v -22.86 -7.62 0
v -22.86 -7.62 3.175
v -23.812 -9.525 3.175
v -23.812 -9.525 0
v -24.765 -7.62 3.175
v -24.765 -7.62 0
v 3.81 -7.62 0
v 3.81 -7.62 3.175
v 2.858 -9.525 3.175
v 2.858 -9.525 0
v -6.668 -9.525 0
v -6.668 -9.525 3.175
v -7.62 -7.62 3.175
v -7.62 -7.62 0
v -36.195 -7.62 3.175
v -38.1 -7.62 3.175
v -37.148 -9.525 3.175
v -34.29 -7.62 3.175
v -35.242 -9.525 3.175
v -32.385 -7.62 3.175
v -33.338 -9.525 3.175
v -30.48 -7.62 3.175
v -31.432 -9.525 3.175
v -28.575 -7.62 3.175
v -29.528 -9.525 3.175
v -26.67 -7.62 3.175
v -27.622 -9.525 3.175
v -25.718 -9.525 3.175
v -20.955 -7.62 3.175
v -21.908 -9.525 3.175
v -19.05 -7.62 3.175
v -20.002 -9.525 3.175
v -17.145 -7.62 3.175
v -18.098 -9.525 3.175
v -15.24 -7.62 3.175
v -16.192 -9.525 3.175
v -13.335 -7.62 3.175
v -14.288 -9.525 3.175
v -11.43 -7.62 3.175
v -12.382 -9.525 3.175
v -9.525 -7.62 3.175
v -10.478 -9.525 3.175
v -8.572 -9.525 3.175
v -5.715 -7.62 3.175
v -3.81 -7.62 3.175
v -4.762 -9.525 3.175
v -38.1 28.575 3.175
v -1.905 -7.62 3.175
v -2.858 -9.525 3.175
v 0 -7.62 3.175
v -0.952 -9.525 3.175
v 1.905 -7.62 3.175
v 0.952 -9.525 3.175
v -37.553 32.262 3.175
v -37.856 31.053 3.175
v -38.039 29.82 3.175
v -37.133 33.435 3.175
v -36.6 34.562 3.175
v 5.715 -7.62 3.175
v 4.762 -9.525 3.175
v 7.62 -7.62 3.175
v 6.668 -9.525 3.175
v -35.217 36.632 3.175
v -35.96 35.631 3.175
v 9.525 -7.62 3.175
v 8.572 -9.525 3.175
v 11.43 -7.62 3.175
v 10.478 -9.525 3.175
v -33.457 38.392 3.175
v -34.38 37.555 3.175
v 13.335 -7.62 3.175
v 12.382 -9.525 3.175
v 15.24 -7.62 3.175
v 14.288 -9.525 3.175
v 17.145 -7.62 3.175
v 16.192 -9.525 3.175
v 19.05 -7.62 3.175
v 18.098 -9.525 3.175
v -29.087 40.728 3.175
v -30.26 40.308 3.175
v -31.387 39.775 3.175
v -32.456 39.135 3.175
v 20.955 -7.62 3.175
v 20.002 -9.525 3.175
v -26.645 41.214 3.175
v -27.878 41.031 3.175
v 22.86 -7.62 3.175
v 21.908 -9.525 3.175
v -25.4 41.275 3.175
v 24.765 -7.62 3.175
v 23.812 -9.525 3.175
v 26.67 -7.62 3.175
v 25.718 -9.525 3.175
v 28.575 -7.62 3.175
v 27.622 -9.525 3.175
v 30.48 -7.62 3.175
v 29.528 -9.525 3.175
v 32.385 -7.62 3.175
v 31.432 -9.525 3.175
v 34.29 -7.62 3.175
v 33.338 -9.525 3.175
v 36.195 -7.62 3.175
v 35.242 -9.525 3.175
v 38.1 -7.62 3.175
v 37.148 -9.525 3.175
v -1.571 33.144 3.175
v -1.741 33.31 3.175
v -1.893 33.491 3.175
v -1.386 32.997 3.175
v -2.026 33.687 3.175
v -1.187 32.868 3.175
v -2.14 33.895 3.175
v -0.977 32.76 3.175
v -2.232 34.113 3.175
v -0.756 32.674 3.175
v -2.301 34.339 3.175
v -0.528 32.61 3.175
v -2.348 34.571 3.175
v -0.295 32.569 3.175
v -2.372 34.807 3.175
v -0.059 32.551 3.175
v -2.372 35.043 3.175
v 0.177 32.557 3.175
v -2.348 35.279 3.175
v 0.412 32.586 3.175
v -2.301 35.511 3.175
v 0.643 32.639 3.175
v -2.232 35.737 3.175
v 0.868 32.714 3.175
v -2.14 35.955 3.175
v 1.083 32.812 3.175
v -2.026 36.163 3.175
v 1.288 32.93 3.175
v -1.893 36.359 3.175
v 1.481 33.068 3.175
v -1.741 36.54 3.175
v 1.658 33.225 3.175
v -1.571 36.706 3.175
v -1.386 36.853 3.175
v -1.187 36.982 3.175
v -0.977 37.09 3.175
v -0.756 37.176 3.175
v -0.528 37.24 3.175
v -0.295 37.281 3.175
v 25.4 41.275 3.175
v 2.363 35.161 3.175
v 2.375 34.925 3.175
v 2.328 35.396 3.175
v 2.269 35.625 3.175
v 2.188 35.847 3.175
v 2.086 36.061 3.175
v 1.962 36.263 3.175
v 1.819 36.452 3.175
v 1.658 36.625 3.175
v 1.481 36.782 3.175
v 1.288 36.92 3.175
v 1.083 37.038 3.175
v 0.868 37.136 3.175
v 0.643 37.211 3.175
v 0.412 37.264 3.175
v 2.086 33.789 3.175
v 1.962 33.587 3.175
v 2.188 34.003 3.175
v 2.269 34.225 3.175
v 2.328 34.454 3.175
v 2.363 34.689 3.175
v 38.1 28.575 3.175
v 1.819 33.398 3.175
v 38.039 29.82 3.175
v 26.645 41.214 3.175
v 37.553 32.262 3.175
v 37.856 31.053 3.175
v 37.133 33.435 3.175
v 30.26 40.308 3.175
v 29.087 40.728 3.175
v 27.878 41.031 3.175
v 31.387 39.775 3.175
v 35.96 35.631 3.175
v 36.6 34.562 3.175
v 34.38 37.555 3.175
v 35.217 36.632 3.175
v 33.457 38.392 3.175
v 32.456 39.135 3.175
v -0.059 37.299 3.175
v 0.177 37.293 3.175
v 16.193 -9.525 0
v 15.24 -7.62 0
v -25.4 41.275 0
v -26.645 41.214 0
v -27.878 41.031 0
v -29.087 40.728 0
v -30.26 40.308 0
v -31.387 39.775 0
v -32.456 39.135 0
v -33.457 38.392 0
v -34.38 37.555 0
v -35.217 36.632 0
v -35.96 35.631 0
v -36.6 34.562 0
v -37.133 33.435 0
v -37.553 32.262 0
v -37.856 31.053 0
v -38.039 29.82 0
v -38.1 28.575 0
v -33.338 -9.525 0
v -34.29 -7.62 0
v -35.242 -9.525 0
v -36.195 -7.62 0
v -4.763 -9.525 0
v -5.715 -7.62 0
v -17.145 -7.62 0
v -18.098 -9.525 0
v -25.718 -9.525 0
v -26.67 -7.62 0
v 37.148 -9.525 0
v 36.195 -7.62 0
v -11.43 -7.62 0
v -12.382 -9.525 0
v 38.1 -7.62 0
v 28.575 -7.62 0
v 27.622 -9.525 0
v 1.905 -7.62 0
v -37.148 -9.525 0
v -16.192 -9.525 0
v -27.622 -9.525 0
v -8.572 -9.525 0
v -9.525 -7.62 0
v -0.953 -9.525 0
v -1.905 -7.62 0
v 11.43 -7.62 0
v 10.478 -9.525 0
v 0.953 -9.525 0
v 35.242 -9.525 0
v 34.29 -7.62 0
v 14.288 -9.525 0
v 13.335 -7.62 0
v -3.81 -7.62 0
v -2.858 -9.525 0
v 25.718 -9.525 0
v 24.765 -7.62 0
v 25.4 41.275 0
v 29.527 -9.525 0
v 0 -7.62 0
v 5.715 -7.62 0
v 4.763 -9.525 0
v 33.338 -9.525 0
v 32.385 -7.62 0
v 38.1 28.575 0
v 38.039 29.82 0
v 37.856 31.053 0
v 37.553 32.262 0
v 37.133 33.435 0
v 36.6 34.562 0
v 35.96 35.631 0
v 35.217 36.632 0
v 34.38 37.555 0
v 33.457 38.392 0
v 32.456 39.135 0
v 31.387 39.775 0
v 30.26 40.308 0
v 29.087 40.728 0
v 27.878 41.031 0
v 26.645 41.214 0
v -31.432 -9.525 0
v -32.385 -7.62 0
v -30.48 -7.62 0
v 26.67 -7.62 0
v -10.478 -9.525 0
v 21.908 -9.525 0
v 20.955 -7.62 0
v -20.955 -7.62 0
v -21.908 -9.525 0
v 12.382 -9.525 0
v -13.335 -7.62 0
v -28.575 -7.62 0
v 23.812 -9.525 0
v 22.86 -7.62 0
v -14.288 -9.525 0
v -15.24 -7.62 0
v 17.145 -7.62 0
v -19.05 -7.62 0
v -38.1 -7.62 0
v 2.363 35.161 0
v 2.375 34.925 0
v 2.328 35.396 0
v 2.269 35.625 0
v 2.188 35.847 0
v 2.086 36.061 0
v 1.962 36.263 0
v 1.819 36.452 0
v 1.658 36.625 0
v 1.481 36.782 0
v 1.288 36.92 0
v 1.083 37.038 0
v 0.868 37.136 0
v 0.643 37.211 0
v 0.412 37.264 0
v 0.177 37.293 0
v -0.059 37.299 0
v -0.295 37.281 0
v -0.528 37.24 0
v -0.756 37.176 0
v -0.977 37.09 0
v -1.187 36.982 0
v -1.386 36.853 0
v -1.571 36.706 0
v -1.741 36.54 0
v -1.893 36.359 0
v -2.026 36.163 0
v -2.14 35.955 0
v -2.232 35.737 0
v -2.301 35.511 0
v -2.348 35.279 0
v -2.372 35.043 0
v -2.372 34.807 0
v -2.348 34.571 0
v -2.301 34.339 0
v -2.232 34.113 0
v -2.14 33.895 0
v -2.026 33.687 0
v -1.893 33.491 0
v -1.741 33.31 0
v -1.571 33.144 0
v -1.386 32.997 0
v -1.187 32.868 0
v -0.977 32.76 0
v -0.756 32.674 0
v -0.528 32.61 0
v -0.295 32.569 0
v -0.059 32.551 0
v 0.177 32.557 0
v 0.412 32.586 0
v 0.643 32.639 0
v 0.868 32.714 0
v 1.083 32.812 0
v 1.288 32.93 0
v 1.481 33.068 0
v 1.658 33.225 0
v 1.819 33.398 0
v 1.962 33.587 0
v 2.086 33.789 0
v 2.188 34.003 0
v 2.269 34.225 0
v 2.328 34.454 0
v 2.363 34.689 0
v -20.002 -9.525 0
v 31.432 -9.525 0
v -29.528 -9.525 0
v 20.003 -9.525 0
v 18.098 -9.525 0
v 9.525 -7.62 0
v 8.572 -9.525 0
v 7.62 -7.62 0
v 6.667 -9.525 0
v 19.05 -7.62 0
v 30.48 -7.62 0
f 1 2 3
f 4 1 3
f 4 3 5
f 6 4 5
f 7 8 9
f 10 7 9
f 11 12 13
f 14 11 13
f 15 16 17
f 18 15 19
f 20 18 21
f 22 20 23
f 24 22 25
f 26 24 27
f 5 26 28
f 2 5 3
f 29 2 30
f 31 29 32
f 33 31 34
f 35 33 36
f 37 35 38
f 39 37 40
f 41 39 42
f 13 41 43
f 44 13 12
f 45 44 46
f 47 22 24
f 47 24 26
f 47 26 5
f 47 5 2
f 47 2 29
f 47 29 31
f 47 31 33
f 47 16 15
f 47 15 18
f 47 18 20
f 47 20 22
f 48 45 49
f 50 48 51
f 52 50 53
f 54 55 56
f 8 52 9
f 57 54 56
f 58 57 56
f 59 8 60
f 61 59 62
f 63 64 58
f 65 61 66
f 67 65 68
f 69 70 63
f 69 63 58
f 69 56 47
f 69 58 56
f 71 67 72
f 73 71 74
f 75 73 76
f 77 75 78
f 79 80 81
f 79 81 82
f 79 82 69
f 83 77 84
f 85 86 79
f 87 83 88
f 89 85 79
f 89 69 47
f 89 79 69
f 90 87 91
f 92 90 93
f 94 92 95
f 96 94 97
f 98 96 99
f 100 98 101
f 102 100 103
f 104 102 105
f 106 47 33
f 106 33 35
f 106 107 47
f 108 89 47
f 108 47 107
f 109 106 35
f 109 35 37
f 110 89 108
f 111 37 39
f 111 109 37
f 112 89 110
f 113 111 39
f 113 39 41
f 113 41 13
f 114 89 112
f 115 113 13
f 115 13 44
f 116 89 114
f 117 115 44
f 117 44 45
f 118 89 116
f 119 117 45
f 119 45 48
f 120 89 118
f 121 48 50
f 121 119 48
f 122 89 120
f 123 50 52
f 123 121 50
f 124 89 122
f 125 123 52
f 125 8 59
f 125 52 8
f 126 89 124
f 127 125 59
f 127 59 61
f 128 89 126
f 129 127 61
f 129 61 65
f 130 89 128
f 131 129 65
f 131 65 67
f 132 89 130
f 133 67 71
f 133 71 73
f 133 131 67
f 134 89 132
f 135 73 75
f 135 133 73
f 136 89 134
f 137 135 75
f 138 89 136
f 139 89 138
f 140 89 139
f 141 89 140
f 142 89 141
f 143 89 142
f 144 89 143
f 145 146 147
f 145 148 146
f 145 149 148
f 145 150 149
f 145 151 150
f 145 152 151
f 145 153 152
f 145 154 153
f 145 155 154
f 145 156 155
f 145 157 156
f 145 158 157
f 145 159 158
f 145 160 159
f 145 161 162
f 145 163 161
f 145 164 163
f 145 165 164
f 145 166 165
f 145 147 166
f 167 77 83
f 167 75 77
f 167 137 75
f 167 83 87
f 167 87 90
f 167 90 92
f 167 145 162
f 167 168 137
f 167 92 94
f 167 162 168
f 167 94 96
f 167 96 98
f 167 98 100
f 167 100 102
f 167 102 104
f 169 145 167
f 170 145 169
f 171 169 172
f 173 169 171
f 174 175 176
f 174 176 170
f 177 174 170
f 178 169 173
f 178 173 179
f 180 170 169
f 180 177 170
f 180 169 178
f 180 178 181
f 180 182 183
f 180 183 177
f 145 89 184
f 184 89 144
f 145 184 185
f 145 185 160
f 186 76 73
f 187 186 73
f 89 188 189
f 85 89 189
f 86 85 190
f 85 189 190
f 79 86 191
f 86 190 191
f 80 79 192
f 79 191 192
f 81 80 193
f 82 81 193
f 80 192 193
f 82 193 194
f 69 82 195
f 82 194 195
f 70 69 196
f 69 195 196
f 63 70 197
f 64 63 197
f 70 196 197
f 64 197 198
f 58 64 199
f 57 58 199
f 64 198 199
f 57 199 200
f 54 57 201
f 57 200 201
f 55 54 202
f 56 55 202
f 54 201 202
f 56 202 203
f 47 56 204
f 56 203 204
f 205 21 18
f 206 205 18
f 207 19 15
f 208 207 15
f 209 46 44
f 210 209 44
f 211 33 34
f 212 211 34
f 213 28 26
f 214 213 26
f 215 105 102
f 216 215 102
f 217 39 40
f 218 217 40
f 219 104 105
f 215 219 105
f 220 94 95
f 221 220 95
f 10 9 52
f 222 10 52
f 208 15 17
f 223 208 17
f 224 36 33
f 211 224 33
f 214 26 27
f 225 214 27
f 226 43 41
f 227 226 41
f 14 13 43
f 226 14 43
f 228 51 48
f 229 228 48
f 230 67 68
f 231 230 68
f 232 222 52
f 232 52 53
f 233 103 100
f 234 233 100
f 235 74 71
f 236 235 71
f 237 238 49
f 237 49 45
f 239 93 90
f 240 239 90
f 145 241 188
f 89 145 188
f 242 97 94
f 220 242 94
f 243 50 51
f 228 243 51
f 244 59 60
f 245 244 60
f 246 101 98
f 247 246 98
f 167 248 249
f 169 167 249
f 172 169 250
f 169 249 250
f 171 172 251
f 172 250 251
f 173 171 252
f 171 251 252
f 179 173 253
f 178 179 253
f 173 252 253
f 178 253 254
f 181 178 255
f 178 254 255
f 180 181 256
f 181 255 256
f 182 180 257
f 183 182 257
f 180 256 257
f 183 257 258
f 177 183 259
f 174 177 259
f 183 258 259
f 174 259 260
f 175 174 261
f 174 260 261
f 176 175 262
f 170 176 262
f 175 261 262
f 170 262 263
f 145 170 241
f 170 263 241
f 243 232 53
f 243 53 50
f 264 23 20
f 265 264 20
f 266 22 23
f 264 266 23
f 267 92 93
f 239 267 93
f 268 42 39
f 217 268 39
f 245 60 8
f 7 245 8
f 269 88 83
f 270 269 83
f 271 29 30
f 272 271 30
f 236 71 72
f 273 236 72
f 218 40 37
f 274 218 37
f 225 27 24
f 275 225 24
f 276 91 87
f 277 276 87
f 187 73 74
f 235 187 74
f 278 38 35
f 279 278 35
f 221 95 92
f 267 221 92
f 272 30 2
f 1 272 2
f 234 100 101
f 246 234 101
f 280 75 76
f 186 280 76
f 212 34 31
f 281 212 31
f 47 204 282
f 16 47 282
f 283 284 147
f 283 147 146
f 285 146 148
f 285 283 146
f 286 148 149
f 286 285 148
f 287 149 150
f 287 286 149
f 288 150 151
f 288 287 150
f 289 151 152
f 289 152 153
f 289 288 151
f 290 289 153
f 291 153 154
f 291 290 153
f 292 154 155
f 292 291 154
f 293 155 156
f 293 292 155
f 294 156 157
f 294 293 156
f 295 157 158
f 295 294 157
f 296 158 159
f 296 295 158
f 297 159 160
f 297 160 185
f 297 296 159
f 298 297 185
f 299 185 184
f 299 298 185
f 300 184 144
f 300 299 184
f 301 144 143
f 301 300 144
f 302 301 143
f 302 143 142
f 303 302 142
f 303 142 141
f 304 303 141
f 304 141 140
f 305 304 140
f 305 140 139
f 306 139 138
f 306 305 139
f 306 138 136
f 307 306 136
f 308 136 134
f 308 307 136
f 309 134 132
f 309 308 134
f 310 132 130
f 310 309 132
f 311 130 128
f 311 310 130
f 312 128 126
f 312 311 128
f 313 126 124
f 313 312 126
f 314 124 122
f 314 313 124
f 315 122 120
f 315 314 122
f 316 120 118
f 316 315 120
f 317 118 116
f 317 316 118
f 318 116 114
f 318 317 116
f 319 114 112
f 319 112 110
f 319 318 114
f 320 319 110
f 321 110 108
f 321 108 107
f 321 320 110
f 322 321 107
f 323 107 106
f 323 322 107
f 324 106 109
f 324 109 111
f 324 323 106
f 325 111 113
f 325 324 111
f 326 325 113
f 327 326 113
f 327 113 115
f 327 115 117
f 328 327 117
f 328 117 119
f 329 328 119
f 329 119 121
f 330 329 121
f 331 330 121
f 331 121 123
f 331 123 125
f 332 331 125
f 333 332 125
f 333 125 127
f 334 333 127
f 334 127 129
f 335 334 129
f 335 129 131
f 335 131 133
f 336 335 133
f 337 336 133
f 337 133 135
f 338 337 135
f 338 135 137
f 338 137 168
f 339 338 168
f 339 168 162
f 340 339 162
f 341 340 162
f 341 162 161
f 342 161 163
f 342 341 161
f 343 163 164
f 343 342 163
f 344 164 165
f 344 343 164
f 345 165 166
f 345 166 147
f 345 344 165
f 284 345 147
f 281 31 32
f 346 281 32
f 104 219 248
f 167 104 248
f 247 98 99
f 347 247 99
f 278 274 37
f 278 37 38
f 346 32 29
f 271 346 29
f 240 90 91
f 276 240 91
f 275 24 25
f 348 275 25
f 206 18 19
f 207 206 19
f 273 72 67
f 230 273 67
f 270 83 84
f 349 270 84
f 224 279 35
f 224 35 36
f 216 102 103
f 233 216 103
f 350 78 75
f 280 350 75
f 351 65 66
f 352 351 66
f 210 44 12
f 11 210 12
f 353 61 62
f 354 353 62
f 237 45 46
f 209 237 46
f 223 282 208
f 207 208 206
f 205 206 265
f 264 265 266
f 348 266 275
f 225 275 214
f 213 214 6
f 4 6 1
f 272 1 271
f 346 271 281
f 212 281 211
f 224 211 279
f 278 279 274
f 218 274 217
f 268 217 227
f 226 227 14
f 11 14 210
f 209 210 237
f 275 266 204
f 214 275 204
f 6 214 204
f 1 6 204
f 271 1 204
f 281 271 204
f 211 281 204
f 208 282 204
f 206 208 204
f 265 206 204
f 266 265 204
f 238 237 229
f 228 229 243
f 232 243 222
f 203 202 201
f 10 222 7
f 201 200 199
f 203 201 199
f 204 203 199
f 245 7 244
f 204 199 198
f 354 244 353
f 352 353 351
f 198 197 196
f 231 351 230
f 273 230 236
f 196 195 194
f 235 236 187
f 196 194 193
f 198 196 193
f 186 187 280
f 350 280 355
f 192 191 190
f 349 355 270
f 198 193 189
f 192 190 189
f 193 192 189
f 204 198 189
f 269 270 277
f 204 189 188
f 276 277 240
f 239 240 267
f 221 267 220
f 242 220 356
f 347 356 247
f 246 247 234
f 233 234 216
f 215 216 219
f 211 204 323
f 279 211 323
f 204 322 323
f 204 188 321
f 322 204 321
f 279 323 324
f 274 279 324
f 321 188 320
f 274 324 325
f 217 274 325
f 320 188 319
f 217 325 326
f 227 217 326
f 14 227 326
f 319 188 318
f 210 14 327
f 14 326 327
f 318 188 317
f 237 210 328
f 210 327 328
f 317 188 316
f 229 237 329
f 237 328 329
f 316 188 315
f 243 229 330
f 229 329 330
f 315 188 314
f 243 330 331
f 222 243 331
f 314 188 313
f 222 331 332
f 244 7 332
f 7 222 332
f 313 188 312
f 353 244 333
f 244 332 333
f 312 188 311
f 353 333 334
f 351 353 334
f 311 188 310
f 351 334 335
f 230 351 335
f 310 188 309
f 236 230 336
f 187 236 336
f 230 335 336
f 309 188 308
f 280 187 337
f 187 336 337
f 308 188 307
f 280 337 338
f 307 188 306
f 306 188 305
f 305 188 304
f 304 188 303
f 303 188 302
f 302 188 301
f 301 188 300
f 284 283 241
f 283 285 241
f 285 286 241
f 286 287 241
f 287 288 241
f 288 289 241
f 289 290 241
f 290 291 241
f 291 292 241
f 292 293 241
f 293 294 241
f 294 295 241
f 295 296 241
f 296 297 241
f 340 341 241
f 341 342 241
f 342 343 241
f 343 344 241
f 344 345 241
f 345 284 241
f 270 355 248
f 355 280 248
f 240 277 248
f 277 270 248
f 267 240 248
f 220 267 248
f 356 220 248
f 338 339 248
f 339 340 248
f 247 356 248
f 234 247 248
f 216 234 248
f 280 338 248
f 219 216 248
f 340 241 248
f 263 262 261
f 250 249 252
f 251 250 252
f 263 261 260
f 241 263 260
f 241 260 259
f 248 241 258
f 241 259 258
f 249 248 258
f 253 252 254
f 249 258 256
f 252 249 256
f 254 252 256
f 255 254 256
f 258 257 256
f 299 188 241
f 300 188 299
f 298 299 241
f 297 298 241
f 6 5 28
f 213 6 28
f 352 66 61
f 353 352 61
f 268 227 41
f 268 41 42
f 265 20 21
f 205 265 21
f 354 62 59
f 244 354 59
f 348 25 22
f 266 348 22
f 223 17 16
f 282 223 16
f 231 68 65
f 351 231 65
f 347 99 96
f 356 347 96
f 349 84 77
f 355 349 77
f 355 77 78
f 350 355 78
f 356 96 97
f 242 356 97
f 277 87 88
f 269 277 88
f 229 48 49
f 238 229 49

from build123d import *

# Parameters (mm, degrees)
F0_R     = 2.3749
F1_DEPTH = 3.175
F3_DEPTH = 25.4


with BuildPart() as f1:
    # F0 (on Top) → F1 (new body)
    with BuildSketch(Plane.XY):
        with BuildLine():
            Line((-38.1, -9.525), (38.1, -9.525))
            Line((38.1, -9.525), (38.1, 28.575))
            ThreePointArc((38.1, 28.575), (34.380256, 37.555256), (25.4, 41.275))
            Line((25.4, 41.275), (3.322108, 41.275))
            Line((3.322108, 41.275), (-25.4, 41.275))
            ThreePointArc((-25.4, 41.275), (-34.380256, 37.555256), (-38.1, 28.575))
            Line((-38.1, 28.575), (-38.1, -9.525))
        make_face()
        with Locations((0, 34.925)):
            Circle(F0_R, mode=Mode.SUBTRACT)
    extrude(amount=F1_DEPTH)

    # F2 (on face) → F3 (cut)
    with BuildSketch(Plane.XY.offset(3.175)):
        Polygon((-38.1, -7.62), (-38.1, -14.148636), (38.1, -14.148636), (38.1, -7.62), (37.1475, -9.525), (36.195, -7.62), (35.2425, -9.525), (34.29, -7.62), (33.3375, -9.525), (32.385, -7.62), (31.4325, -9.525), (30.48, -7.62), (29.5275, -9.525), (28.575, -7.62), (27.6225, -9.525), (26.67, -7.62), (25.7175, -9.525), (24.765, -7.62), (23.8125, -9.525), (22.86, -7.62), (21.9075, -9.525), (20.955, -7.62), (20.0025, -9.525), (19.05, -7.62), (18.0975, -9.525), (17.145, -7.62), (16.1925, -9.525), (15.24, -7.62), (14.2875, -9.525), (13.335, -7.62), (12.3825, -9.525), (11.43, -7.62), (10.4775, -9.525), (9.525, -7.62), (8.5725, -9.525), (7.62, -7.62), (6.6675, -9.525), (5.715, -7.62), (4.7625, -9.525), (3.81, -7.62), (2.8575, -9.525), (1.905, -7.62), (0.9525, -9.525), (0, -7.62), (-0.9525, -9.525), (-1.905, -7.62), (-2.8575, -9.525), (-3.81, -7.62), (-4.7625, -9.525), (-5.715, -7.62), (-6.6675, -9.525), (-7.62, -7.62), (-8.5725, -9.525), (-9.525, -7.62), (-10.4775, -9.525), (-11.43, -7.62), (-12.3825, -9.525), (-13.335, -7.62), (-14.2875, -9.525), (-15.24, -7.62), (-16.1925, -9.525), (-17.145, -7.62), (-18.0975, -9.525), (-19.05, -7.62), (-20.0025, -9.525), (-20.955, -7.62), (-21.9075, -9.525), (-22.86, -7.62), (-23.8125, -9.525), (-24.765, -7.62), (-25.7175, -9.525), (-26.67, -7.62), (-27.6225, -9.525), (-28.575, -7.62), (-29.5275, -9.525), (-30.48, -7.62), (-31.4325, -9.525), (-32.385, -7.62), (-33.3375, -9.525), (-34.29, -7.62), (-35.2425, -9.525), (-36.195, -7.62), (-37.1475, -9.525), align=None)
    extrude(amount=-F3_DEPTH, mode=Mode.SUBTRACT)


solid = f1.part
